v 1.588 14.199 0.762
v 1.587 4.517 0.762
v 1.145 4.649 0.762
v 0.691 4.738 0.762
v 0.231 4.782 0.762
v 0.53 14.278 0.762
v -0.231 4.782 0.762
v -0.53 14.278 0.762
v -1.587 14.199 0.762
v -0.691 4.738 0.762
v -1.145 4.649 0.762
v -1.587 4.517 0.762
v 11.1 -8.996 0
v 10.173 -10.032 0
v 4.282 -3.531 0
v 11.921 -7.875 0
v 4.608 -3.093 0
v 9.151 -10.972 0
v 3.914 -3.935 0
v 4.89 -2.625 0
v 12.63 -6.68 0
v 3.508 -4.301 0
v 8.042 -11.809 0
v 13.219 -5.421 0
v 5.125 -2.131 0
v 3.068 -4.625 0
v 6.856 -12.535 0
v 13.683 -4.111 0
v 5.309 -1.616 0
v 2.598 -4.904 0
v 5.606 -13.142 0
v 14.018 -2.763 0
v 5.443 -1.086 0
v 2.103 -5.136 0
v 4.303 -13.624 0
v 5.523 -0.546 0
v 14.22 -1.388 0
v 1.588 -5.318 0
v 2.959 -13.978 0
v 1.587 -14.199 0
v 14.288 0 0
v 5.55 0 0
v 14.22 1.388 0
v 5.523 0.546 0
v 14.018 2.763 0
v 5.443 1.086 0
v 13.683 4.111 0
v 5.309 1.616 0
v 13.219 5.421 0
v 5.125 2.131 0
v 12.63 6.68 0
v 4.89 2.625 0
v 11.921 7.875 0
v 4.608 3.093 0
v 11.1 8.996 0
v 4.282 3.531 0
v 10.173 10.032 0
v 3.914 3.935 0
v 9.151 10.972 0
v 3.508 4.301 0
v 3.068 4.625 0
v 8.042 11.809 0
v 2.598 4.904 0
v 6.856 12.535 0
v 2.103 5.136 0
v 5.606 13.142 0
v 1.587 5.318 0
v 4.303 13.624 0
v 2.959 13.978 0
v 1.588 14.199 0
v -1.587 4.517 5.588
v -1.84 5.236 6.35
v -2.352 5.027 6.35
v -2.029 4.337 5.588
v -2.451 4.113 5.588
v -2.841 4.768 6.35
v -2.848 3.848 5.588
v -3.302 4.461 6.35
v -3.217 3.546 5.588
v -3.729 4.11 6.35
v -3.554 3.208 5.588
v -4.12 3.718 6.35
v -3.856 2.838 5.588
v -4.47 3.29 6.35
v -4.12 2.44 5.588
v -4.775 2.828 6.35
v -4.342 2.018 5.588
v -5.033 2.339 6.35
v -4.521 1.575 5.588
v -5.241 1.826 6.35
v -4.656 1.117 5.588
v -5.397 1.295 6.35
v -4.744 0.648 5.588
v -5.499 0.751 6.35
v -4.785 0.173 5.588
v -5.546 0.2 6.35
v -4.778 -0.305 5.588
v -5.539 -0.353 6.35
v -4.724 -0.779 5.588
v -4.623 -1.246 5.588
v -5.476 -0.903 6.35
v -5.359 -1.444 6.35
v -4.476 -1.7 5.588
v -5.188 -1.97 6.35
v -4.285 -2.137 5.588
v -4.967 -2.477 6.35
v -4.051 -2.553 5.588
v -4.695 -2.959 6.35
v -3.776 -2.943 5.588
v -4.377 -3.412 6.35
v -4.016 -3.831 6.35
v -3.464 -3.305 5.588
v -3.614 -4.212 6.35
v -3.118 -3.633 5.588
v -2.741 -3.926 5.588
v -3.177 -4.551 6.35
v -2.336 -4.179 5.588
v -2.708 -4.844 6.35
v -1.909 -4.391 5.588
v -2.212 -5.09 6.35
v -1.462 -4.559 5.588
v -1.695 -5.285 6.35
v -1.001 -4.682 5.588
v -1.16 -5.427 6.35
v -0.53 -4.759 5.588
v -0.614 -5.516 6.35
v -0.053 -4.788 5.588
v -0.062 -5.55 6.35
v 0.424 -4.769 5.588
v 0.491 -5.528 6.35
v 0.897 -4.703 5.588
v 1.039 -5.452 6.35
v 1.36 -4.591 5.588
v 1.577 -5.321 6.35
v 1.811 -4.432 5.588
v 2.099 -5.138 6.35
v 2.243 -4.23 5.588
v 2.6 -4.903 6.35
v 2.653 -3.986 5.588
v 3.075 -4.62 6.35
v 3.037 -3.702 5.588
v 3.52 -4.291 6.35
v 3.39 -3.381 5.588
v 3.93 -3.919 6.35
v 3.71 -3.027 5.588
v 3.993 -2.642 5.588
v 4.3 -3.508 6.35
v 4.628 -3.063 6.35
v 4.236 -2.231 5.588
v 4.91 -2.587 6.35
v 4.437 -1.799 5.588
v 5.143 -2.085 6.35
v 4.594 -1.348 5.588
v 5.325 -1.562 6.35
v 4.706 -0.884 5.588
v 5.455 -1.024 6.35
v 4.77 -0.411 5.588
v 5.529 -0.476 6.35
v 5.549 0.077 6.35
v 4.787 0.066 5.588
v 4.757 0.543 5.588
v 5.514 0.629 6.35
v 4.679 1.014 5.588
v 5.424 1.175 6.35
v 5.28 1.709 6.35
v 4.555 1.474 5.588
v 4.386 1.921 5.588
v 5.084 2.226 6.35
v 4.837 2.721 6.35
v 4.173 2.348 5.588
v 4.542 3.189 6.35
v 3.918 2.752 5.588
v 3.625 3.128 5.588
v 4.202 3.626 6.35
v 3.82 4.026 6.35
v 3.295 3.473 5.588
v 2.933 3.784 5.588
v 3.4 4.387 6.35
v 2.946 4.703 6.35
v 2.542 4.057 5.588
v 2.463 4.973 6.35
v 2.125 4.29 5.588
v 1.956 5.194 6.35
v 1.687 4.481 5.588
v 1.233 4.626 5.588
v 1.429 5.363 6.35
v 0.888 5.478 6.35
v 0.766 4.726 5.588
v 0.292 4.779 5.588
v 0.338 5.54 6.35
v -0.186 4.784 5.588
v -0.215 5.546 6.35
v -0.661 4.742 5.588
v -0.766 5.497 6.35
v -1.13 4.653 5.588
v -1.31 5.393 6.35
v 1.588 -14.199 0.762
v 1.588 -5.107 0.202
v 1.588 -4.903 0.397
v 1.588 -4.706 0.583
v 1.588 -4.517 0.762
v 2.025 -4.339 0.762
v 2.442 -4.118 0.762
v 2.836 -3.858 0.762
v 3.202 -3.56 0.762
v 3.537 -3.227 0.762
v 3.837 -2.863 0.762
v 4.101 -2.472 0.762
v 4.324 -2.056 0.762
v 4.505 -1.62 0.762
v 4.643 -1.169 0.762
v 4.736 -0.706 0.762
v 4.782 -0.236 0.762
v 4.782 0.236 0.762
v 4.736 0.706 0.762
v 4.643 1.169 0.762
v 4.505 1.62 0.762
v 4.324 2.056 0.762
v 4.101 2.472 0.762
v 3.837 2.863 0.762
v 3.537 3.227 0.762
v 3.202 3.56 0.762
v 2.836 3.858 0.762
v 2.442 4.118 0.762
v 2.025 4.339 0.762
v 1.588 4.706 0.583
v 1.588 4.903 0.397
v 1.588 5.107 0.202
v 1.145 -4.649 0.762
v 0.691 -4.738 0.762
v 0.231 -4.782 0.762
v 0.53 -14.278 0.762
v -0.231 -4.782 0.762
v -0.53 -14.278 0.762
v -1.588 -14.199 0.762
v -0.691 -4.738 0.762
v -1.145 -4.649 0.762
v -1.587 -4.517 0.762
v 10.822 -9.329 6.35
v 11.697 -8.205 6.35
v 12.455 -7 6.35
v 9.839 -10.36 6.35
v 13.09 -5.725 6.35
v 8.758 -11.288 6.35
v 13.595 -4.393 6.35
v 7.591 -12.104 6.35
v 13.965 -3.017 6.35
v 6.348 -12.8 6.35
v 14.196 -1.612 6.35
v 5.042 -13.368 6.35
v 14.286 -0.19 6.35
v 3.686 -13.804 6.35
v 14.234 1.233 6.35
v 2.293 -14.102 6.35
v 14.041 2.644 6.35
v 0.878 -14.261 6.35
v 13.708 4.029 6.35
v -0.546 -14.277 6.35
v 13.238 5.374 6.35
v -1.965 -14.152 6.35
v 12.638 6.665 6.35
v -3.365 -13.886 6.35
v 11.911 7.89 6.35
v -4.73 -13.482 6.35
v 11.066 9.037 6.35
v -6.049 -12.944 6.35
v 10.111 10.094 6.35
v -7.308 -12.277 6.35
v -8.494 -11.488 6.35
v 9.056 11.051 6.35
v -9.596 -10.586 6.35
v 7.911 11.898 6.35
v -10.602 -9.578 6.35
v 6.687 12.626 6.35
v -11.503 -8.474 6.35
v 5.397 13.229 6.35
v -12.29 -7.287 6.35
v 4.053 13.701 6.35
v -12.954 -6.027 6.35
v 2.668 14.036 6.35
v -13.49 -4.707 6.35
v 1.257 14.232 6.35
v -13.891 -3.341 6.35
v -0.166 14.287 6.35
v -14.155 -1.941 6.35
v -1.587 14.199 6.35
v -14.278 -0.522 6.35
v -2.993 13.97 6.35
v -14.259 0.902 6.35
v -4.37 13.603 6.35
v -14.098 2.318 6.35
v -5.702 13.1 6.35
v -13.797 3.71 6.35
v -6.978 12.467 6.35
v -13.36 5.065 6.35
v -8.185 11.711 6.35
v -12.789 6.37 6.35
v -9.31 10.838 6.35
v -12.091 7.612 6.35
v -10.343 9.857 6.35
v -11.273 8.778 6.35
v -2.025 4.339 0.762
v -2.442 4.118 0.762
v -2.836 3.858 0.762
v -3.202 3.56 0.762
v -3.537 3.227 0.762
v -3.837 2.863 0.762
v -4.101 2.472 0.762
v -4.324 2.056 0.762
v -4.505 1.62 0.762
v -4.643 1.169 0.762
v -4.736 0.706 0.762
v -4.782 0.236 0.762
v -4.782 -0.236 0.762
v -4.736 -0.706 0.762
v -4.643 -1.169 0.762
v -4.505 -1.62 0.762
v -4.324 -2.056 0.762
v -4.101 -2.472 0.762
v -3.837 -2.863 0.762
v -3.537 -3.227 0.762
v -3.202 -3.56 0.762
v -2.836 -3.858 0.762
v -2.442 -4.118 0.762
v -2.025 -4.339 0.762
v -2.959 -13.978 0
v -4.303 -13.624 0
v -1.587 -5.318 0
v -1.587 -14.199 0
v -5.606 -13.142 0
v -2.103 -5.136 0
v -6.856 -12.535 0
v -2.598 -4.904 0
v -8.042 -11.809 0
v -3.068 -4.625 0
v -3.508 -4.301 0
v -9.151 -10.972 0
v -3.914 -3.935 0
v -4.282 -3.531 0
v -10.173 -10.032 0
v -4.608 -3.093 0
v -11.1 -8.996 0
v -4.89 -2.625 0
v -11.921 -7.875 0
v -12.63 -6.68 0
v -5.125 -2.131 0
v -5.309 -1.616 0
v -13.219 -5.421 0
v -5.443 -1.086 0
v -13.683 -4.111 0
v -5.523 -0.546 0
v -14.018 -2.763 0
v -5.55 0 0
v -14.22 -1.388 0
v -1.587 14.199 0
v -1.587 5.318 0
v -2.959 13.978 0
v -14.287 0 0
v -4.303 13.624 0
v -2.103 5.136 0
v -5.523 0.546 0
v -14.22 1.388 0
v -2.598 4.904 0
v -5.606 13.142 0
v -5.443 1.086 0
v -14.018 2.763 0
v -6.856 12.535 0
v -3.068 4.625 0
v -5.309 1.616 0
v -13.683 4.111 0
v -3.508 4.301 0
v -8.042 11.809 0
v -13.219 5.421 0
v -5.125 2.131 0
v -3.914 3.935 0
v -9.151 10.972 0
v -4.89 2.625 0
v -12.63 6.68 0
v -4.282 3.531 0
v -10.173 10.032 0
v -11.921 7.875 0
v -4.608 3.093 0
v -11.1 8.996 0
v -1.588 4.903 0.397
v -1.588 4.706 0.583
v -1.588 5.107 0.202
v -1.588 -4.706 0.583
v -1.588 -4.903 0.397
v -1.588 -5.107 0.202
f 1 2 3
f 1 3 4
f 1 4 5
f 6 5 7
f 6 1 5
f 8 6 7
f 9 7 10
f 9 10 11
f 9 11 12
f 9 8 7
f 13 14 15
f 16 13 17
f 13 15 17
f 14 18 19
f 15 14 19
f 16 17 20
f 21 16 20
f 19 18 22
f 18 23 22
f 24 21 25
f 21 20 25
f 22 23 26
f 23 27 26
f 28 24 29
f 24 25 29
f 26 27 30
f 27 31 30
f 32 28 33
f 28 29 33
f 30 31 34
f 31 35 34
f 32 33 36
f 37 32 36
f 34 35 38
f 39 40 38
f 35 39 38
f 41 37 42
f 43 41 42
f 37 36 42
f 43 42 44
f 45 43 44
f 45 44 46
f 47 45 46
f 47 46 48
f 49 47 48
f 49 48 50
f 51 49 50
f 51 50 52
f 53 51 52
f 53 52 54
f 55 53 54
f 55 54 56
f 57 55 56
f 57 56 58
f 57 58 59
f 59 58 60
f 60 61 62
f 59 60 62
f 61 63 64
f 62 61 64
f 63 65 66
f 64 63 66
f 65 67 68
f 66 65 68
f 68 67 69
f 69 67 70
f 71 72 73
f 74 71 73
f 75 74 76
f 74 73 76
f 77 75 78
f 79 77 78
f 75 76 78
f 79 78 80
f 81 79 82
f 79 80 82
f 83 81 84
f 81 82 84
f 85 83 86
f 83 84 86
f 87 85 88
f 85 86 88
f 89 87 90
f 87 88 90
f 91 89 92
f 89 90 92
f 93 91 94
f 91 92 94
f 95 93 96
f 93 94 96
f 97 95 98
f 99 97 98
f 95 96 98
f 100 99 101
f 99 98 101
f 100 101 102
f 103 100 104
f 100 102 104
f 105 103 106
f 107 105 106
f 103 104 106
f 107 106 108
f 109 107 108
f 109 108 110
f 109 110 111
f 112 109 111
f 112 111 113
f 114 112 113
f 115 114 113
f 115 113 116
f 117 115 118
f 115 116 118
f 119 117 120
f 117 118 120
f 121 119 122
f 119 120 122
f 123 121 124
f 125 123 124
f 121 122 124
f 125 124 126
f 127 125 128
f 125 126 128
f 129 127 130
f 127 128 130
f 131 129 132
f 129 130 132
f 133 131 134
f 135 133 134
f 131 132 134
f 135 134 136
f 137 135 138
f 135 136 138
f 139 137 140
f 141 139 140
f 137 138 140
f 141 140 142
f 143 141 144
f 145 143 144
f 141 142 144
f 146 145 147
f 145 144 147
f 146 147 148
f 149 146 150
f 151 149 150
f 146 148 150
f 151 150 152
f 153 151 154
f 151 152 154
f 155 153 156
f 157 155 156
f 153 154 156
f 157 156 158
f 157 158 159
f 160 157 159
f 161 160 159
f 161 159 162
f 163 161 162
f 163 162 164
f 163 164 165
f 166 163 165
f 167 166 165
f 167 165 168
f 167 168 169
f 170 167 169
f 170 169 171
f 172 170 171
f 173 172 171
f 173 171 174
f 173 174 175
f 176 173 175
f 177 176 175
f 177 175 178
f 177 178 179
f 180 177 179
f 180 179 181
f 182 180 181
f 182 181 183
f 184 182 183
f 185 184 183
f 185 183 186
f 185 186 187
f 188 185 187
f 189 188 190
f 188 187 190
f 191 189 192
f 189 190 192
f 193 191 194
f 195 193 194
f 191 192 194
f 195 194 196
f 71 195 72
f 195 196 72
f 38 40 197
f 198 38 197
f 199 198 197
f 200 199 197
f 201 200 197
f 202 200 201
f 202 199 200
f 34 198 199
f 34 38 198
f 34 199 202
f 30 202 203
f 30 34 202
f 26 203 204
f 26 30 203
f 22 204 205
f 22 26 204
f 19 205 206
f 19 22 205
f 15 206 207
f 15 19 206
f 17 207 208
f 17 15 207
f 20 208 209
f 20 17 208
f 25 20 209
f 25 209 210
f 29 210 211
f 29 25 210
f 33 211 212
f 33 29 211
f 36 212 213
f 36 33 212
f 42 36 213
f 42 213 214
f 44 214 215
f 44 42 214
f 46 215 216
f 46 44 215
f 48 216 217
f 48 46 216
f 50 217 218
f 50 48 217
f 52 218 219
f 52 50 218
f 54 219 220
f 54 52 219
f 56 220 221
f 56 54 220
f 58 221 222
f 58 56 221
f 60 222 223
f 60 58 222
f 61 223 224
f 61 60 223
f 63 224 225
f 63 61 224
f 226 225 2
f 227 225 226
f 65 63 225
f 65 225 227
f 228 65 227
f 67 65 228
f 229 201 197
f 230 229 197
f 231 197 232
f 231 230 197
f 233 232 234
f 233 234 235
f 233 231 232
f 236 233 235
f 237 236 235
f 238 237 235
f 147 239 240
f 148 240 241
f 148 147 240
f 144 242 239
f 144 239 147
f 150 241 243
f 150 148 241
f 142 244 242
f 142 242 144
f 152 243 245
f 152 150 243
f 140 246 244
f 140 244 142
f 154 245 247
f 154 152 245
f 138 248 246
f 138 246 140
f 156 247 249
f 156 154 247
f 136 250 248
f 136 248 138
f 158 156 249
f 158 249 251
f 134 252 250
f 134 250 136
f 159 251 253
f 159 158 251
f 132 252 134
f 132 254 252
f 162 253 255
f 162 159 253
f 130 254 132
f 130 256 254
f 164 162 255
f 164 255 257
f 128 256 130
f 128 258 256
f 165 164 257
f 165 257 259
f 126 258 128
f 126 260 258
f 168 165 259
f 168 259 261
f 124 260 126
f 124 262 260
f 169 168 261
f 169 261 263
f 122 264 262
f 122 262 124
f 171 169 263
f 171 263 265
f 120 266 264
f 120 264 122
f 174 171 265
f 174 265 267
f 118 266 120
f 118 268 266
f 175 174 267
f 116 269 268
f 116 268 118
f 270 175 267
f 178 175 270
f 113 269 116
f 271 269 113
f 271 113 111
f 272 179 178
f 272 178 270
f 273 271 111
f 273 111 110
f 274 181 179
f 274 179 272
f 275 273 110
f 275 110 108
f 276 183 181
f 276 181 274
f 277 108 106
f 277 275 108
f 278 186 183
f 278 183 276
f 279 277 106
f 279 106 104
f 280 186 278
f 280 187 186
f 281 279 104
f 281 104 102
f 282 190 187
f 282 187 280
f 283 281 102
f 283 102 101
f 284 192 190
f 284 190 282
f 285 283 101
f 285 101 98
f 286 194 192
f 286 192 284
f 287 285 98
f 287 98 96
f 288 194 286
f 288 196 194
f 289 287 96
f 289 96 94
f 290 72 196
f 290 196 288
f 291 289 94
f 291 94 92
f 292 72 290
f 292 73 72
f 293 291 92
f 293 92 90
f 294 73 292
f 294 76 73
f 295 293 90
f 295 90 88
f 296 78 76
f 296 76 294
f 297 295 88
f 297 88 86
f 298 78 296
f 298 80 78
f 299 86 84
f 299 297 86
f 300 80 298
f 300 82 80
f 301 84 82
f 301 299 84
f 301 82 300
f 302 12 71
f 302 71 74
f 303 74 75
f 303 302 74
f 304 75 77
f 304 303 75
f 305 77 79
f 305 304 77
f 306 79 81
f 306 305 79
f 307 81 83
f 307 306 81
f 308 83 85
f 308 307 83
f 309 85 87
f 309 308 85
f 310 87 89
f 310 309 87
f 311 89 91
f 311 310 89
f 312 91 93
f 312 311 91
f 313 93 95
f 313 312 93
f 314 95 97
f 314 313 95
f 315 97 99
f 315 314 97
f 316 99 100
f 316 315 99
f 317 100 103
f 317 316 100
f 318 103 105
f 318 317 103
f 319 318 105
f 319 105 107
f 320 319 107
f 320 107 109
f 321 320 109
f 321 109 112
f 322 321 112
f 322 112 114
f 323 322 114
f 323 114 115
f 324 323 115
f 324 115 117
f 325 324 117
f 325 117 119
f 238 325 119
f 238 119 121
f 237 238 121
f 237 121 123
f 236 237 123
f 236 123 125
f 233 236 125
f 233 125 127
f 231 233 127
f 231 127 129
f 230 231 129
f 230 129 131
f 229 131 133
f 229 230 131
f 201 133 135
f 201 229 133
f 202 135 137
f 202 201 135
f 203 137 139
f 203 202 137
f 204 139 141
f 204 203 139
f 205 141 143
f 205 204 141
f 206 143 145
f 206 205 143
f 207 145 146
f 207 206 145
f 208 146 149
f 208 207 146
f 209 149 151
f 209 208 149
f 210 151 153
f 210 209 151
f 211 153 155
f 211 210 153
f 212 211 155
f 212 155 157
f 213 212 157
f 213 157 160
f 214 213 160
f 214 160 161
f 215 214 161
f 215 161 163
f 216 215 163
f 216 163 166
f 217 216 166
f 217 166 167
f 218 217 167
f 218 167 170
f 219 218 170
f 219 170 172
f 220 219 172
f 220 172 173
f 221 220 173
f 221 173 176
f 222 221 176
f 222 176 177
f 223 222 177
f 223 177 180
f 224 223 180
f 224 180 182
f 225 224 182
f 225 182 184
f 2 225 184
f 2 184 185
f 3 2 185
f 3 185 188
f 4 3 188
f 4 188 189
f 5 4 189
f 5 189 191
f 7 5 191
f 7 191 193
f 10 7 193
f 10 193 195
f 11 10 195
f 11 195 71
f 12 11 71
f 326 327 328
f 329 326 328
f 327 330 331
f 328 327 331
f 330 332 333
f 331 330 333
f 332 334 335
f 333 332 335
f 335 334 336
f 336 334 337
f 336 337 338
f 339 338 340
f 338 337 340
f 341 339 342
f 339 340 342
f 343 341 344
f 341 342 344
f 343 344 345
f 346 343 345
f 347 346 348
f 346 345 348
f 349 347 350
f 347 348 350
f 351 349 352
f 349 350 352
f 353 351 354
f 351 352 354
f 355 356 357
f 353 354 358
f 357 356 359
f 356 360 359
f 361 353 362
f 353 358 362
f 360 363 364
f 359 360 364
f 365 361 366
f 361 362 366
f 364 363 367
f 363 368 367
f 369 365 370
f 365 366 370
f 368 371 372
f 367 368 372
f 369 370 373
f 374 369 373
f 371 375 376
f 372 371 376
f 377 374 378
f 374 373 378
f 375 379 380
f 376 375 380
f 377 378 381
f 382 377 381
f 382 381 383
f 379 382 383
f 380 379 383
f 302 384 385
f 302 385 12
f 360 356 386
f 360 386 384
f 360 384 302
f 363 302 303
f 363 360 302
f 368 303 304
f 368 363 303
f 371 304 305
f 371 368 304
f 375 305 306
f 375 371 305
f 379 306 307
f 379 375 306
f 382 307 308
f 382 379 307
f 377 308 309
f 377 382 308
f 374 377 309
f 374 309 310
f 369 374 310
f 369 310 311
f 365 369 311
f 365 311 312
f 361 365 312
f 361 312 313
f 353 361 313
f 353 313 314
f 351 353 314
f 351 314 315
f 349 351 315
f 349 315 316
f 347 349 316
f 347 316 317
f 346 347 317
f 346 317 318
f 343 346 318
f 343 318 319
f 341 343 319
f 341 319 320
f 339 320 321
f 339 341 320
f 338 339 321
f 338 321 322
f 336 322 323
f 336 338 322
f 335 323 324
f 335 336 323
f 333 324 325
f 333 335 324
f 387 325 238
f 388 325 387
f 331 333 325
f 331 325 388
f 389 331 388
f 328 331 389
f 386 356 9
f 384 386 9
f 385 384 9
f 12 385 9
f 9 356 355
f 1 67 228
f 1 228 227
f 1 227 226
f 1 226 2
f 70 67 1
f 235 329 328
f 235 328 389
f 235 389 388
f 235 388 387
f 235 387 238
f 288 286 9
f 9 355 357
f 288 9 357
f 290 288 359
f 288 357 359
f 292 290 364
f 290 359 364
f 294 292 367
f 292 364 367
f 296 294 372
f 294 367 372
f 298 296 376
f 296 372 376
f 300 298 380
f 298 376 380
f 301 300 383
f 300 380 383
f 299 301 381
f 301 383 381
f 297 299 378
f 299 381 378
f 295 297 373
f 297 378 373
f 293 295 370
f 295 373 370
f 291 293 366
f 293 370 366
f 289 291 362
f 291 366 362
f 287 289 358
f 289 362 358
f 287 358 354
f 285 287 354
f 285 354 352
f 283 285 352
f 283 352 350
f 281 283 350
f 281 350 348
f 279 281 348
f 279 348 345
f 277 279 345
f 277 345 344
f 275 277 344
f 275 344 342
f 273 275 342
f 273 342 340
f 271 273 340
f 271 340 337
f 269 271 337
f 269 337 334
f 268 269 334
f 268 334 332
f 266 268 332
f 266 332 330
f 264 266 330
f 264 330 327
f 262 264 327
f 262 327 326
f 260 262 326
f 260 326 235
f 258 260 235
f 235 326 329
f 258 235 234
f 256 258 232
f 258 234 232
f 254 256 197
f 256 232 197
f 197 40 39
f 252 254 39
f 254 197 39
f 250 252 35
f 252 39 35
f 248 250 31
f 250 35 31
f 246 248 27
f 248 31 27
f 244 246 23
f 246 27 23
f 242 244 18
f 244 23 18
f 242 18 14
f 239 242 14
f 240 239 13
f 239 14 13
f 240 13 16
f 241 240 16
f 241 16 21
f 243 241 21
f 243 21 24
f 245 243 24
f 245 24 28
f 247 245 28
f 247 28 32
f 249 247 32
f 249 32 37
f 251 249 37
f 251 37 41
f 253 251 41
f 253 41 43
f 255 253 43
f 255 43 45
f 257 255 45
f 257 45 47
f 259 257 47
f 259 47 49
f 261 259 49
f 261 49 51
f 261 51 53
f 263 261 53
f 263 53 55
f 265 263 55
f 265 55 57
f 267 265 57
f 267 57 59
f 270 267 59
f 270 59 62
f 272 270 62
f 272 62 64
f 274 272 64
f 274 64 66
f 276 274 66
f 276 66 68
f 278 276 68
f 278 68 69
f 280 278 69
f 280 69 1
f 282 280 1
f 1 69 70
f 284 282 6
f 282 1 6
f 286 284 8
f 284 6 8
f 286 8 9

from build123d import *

# Parameters (mm, degrees)
SKETCH1_R          = 14.2875
SKETCH1_R_2        = 4.7879
EXTRUDE1_DEPTH     = 6.35
CHAMFER2_SIZE      = 0.762
SKETCH2_W          = 3.175
SKETCH2_H          = 28.575
CUT_EXTRUDE1_DEPTH = 0.762


with BuildPart() as part:
    # Sketch1 → Extrude1 (new body)
    with BuildSketch(Plane.XY):
        with Locations(Location((0, 0, 0), (0, 0, 96.379370208))):  # turned: the seam where the file's is
            Circle(SKETCH1_R)
        with Locations(Location((0, 0, 0), (0, 0, 109.363791367))):  # turned: the seam where the file's is
            Circle(SKETCH1_R_2, mode=Mode.SUBTRACT)
    extrude(amount=EXTRUDE1_DEPTH)

    # Chamfer2
    chamfer2_edges = [part.edges().sort_by_distance(p)[0] for p in [
        (1.5875, -4.517059902, 0),
        (1.5875, -4.517059902, 6.35),
    ]]
    chamfer(chamfer2_edges, length=CHAMFER2_SIZE)

    # Sketch2 → Cut-Extrude1 (cut)
    with BuildSketch(Plane(origin=(0, 0, 0), x_dir=(-1, 0, 0), z_dir=(0, 0, -1))):
        Rectangle(SKETCH2_W, SKETCH2_H)
    extrude(amount=-CUT_EXTRUDE1_DEPTH, mode=Mode.SUBTRACT)


solid = part.part
